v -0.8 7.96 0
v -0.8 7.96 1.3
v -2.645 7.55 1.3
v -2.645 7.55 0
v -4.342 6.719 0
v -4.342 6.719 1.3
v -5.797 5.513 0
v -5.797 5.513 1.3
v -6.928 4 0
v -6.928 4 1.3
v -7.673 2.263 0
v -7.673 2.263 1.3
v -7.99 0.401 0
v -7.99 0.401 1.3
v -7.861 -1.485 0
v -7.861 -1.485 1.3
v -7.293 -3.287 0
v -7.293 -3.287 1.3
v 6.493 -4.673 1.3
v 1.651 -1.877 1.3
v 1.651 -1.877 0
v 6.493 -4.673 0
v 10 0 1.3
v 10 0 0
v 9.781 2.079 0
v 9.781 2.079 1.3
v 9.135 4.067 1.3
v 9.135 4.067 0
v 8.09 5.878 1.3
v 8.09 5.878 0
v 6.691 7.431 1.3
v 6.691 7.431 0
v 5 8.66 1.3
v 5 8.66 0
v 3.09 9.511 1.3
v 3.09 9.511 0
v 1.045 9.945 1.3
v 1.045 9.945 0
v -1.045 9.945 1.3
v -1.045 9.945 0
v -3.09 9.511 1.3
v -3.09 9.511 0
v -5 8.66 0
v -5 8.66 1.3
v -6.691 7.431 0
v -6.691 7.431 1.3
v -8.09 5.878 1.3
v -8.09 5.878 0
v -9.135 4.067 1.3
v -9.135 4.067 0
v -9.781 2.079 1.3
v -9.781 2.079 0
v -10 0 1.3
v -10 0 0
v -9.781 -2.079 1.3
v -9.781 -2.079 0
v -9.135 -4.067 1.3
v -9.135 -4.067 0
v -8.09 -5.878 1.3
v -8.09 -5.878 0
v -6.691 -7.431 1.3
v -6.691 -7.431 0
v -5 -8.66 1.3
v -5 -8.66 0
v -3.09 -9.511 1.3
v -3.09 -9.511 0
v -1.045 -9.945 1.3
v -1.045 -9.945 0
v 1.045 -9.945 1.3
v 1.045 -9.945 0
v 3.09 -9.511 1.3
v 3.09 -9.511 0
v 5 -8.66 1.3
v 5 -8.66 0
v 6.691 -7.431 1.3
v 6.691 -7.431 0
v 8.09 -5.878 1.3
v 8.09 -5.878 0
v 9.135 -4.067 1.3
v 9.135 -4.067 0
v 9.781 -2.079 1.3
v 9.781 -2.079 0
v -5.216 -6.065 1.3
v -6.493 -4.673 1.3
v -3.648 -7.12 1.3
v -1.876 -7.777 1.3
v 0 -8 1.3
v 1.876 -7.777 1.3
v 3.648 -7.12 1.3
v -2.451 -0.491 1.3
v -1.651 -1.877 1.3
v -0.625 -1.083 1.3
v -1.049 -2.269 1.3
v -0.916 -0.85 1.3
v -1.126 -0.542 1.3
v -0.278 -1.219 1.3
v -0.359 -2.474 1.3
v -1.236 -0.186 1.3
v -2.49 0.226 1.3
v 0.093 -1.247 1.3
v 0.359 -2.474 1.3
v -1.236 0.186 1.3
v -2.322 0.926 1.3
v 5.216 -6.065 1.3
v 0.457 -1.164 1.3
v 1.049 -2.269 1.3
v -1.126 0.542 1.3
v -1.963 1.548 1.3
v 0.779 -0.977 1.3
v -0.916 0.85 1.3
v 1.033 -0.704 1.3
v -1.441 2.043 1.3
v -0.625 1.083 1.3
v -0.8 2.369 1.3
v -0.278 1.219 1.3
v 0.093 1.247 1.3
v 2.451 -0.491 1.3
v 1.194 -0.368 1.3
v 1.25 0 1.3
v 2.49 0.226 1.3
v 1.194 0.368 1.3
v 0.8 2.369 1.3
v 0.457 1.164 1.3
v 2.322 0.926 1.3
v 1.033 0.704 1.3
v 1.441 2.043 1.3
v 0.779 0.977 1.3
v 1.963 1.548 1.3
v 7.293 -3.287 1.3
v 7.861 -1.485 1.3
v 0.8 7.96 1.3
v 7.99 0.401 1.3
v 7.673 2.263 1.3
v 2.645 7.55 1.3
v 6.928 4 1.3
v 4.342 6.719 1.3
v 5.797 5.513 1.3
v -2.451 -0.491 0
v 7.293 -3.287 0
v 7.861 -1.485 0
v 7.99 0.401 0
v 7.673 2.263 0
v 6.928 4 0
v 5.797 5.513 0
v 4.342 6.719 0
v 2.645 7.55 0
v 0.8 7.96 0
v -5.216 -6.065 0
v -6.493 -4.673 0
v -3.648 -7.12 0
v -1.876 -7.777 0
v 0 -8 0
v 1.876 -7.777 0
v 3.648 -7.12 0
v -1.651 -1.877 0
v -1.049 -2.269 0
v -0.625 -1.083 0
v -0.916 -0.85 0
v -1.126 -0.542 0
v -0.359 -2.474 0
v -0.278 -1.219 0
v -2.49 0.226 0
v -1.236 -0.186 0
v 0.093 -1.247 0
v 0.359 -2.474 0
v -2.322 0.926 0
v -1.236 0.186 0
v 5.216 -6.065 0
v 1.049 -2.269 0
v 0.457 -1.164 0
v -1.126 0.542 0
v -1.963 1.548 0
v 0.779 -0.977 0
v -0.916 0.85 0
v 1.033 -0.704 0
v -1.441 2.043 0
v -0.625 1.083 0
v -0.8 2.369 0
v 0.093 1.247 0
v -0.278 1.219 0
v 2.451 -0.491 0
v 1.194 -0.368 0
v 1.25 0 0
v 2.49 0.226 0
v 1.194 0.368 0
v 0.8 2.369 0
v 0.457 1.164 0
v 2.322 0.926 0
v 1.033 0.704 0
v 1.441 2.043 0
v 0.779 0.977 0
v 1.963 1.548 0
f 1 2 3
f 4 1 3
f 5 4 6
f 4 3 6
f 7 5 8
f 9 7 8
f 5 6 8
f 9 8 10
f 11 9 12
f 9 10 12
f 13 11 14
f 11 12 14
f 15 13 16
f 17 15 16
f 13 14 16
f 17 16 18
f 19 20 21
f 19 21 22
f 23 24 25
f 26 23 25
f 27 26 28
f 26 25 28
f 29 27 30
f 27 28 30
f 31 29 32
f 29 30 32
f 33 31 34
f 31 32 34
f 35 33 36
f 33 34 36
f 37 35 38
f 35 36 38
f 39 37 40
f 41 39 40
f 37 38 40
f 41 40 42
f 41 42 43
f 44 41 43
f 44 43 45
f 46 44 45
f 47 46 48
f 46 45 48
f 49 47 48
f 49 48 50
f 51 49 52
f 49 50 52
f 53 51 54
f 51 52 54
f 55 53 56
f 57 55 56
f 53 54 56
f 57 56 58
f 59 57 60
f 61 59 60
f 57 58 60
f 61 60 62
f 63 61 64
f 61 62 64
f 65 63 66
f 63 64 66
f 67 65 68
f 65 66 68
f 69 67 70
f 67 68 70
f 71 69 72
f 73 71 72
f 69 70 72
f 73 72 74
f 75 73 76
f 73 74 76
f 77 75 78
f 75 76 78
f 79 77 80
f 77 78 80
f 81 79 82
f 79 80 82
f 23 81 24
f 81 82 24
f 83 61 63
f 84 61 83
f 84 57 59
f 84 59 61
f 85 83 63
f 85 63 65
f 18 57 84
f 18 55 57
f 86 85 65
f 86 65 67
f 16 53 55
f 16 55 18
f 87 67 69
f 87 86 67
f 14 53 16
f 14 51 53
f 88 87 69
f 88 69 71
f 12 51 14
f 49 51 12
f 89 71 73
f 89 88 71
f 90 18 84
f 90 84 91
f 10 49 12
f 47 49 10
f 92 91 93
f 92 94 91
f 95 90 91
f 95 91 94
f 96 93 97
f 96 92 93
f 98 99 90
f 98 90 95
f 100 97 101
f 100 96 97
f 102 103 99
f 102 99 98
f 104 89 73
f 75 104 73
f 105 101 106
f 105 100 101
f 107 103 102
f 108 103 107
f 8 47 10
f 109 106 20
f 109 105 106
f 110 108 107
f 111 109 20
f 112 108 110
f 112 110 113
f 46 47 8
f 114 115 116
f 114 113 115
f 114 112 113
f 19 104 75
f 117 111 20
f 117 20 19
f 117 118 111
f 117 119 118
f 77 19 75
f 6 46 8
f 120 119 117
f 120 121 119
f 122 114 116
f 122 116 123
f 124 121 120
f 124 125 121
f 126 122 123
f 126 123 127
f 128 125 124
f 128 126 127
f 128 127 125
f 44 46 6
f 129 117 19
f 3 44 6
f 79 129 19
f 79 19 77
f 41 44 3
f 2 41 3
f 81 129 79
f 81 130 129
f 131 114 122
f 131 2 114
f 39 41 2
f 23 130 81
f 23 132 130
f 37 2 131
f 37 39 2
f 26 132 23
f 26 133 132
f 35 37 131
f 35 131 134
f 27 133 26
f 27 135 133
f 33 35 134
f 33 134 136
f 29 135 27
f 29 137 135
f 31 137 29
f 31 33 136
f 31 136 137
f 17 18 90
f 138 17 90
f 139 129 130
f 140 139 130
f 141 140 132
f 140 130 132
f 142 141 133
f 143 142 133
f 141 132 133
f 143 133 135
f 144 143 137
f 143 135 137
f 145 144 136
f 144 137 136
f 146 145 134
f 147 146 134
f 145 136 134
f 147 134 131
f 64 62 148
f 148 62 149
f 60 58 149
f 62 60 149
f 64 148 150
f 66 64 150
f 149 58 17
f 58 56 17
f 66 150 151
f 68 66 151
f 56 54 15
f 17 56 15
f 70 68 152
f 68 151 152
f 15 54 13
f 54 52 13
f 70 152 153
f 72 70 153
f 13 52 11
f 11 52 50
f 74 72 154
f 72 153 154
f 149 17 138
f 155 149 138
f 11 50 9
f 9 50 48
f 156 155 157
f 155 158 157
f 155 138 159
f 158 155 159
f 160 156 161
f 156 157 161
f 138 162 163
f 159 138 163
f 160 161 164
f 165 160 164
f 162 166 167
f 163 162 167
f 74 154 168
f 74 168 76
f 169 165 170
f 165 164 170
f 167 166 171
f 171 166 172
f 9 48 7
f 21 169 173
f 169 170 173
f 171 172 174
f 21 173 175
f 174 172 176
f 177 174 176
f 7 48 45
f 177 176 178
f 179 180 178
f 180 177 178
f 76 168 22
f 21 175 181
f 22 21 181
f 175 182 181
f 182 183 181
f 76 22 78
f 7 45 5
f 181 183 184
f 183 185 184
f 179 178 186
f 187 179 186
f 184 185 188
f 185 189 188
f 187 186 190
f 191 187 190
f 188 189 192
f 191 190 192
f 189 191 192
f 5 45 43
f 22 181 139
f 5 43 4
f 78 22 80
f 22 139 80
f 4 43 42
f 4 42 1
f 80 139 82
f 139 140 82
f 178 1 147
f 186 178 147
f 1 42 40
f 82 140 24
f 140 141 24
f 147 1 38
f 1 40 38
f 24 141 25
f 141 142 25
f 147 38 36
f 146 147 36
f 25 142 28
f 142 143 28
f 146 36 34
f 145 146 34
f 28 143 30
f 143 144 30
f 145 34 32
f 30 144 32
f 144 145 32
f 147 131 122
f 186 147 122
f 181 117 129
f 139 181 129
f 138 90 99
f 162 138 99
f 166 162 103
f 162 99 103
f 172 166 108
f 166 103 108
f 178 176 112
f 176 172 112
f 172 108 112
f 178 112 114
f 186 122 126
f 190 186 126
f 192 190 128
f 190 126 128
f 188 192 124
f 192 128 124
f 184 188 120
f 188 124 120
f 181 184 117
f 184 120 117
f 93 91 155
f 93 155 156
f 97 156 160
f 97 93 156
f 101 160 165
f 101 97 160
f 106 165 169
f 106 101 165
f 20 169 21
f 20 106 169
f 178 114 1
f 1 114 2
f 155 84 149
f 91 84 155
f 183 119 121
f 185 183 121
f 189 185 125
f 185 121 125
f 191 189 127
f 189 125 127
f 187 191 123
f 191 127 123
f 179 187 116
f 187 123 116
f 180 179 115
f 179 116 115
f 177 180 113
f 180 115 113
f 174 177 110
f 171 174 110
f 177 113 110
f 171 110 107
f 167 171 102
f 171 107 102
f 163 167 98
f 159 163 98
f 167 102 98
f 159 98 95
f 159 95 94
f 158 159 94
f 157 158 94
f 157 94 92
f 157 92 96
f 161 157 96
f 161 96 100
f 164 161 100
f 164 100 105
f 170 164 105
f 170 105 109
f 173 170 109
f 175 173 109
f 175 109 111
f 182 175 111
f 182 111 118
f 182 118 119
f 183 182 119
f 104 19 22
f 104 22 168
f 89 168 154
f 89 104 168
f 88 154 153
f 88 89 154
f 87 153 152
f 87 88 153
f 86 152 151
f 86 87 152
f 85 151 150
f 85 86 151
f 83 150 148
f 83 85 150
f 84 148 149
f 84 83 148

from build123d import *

# Parameters (mm, degrees)
ESQUISSE1_R             = 10
BOSS_EXTRU_1_DEPTH      = 1.3
ENL_V_MAT_EXTRU_1_DEPTH = 2.3
ESQUISSE3_R             = 1.25
ENL_V_MAT_EXTRU_2_DEPTH = 2.3


with BuildPart() as part:
    # Esquisse1 → Boss.-Extru.1 (new body)
    with BuildSketch(Plane.XY):
        Circle(ESQUISSE1_R)
    extrude(amount=BOSS_EXTRU_1_DEPTH)

    # Esquisse2 → Enlèv. mat.-Extru.1 (cut, through all)
    with BuildSketch(Plane.XY.offset(1.3)):
        with BuildLine():
            Line((-7.293475176, -3.287129425), (-2.45121915, -0.491451605))
            ThreePointArc((-2.45121915, -0.491451605), (-2.165063509, 1.25), (-0.8, 2.368543856))
            Line((-0.8, 2.368543856), (-0.8, 7.959899497))
            ThreePointArc((-0.8, 7.959899497), (-6.92820323, 4), (-7.293475176, -3.287129425))
        make_face()
        with BuildLine():
            Line((-6.493475176, -4.672770071), (-1.65121915, -1.877092251))
            ThreePointArc((-1.65121915, -1.877092251), (0, -2.5), (1.65121915, -1.877092251))
            Line((1.65121915, -1.877092251), (6.493475176, -4.672770071))
            ThreePointArc((6.493475176, -4.672770071), (0, -8), (-6.493475176, -4.672770071))
        make_face()
        with BuildLine():
            Line((2.45121915, -0.491451605), (7.293475176, -3.287129425))
            ThreePointArc((7.293475176, -3.287129425), (6.92820323, 4), (0.8, 7.959899497))
            Line((0.8, 7.959899497), (0.8, 2.368543856))
            ThreePointArc((0.8, 2.368543856), (2.165063509, 1.25), (2.45121915, -0.491451605))
        make_face()
    extrude(amount=-ENL_V_MAT_EXTRU_1_DEPTH, mode=Mode.SUBTRACT)

    # Esquisse3 → Enlèv. mat.-Extru.2 (cut, through all)
    with BuildSketch(Plane.XY.offset(1.3)):
        Circle(ESQUISSE3_R)
    extrude(amount=-ENL_V_MAT_EXTRU_2_DEPTH, mode=Mode.SUBTRACT)


solid = part.part
